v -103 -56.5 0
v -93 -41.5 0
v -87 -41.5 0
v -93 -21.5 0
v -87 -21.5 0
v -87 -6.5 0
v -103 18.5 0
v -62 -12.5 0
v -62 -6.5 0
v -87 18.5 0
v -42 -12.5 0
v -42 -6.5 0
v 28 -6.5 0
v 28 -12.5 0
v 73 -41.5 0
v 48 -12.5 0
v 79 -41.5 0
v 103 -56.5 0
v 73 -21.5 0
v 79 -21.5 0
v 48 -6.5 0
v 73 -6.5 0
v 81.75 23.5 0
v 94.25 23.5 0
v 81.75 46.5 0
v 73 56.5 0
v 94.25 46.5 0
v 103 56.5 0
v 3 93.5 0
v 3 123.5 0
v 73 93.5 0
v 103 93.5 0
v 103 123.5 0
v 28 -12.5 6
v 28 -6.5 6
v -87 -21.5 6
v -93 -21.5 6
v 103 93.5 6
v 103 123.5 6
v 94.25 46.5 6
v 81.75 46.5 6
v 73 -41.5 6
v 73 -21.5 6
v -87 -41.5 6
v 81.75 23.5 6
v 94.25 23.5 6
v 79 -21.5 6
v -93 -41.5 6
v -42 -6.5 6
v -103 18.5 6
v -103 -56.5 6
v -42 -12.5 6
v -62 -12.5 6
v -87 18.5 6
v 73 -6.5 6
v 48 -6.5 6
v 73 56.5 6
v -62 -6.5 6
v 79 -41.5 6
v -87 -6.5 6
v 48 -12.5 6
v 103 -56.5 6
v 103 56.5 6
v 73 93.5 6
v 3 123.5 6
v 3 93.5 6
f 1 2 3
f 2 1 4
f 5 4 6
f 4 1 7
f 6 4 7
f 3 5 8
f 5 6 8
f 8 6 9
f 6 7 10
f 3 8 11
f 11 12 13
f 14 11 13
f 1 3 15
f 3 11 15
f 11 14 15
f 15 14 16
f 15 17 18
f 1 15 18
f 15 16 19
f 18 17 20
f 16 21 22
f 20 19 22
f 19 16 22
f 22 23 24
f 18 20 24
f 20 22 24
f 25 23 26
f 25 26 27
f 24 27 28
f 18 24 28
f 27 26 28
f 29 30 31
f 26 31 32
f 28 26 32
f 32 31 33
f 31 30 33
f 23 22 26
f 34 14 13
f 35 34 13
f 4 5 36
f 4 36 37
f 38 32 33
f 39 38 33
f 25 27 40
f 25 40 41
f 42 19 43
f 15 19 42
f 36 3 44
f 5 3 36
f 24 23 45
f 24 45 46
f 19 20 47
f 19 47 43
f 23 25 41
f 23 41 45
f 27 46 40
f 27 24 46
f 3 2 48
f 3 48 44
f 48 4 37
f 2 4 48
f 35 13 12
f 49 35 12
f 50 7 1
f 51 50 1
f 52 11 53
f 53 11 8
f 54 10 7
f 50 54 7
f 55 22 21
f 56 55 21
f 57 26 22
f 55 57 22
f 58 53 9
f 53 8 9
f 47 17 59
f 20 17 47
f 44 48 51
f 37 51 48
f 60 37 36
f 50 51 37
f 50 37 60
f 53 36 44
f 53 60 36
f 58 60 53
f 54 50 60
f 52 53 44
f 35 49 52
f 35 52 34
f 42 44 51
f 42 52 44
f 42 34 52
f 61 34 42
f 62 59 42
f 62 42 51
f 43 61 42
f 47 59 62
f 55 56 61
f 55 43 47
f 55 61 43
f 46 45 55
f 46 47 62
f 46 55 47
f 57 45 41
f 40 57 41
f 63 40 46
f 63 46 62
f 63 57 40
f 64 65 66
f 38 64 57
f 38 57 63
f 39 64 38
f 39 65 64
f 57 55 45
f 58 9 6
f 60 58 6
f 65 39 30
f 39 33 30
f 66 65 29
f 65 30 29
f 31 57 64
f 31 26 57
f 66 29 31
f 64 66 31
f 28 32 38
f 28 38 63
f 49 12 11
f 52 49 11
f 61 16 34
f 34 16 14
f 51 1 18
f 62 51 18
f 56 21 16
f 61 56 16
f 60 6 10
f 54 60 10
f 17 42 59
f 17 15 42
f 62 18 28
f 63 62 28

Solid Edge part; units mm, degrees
sketch "Sketch1" plane through (0, 0, 0) normal (0, 0, 1) x (1, 0, 0)
  line L0 (-87, -21.5) -> (-93, -21.5)
  line L1 (-93, -21.5) -> (-93, -41.5)
  line L2 (-93, -41.5) -> (-87, -41.5)
  line L3 (-87, -41.5) -> (-87, -21.5)
  line L4 (79, -21.5) -> (73, -21.5)
  line L5 (73, -21.5) -> (73, -41.5)
  line L6 (73, -41.5) -> (79, -41.5)
  line L7 (79, -41.5) -> (79, -21.5)
  line L8 (81.75, 23.5) -> (94.25, 23.5)
  line L9 (94.25, 23.5) -> (94.25, 46.5)
  line L10 (94.25, 46.5) -> (81.75, 46.5)
  line L11 (81.75, 46.5) -> (81.75, 23.5)
  line L12 (103, 93.5) -> (103, 123.5)
  line L13 (103, 123.5) -> (3, 123.5)
  line L14 (3, 123.5) -> (3, 93.5)
  line L15 (3, 93.5) -> (73, 93.5)
  line L16 (73, 56.5) -> (73, 93.5)
  line L17 (73, 56.5) -> (73, -6.5)
  line L18 (73, -6.5) -> (48, -6.5)
  line L19 (48, -6.5) -> (48, -12.5)
  line L20 (48, -12.5) -> (28, -12.5)
  line L21 (28, -12.5) -> (28, -6.5)
  line L22 (28, -6.5) -> (-42, -6.5)
  line L23 (-42, -6.5) -> (-42, -12.5)
  line L24 (-42, -12.5) -> (-62, -12.5)
  line L25 (-62, -12.5) -> (-62, -6.5)
  line L26 (-62, -6.5) -> (-87, -6.5)
  line L27 (-87, -6.5) -> (-87, 18.5)
  line L28 (-87, 18.5) -> (-103, 18.5)
  line L29 (-103, 18.5) -> (-103, -56.5)
  line L30 (-103, -56.5) -> (103, -56.5)
  line L31 (103, -56.5) -> (103, 56.5)
  line L32 (103, 93.5) -> (103, 56.5)
  dimension "D1" = 16
  dimension "D2" = 30
  dimension "D3" = 20
  dimension "D4" = 6
  dimension "D5" = 20
  dimension "D6" = 6
  dimension "D7" = 15
  dimension "D8" = 15
  dimension "D9" = 20
  dimension "D10" = 20
  dimension "D11" = 25
  dimension "D12" = 25
  dimension "D13" = 6
  dimension "D14" = 6
  dimension "D15" = 75
  dimension "D16" = 25
  dimension "D17" = 50
  dimension "D18" = 113
  dimension "D19" = 6
  dimension "D20" = 23
  dimension "D21" = 12.5
  dimension "D22" = 160
  dimension "D23" = 100
  dimension "D24" = 30
extrude "Protrusion1" add sketch "Sketch1" along normal blind 6
